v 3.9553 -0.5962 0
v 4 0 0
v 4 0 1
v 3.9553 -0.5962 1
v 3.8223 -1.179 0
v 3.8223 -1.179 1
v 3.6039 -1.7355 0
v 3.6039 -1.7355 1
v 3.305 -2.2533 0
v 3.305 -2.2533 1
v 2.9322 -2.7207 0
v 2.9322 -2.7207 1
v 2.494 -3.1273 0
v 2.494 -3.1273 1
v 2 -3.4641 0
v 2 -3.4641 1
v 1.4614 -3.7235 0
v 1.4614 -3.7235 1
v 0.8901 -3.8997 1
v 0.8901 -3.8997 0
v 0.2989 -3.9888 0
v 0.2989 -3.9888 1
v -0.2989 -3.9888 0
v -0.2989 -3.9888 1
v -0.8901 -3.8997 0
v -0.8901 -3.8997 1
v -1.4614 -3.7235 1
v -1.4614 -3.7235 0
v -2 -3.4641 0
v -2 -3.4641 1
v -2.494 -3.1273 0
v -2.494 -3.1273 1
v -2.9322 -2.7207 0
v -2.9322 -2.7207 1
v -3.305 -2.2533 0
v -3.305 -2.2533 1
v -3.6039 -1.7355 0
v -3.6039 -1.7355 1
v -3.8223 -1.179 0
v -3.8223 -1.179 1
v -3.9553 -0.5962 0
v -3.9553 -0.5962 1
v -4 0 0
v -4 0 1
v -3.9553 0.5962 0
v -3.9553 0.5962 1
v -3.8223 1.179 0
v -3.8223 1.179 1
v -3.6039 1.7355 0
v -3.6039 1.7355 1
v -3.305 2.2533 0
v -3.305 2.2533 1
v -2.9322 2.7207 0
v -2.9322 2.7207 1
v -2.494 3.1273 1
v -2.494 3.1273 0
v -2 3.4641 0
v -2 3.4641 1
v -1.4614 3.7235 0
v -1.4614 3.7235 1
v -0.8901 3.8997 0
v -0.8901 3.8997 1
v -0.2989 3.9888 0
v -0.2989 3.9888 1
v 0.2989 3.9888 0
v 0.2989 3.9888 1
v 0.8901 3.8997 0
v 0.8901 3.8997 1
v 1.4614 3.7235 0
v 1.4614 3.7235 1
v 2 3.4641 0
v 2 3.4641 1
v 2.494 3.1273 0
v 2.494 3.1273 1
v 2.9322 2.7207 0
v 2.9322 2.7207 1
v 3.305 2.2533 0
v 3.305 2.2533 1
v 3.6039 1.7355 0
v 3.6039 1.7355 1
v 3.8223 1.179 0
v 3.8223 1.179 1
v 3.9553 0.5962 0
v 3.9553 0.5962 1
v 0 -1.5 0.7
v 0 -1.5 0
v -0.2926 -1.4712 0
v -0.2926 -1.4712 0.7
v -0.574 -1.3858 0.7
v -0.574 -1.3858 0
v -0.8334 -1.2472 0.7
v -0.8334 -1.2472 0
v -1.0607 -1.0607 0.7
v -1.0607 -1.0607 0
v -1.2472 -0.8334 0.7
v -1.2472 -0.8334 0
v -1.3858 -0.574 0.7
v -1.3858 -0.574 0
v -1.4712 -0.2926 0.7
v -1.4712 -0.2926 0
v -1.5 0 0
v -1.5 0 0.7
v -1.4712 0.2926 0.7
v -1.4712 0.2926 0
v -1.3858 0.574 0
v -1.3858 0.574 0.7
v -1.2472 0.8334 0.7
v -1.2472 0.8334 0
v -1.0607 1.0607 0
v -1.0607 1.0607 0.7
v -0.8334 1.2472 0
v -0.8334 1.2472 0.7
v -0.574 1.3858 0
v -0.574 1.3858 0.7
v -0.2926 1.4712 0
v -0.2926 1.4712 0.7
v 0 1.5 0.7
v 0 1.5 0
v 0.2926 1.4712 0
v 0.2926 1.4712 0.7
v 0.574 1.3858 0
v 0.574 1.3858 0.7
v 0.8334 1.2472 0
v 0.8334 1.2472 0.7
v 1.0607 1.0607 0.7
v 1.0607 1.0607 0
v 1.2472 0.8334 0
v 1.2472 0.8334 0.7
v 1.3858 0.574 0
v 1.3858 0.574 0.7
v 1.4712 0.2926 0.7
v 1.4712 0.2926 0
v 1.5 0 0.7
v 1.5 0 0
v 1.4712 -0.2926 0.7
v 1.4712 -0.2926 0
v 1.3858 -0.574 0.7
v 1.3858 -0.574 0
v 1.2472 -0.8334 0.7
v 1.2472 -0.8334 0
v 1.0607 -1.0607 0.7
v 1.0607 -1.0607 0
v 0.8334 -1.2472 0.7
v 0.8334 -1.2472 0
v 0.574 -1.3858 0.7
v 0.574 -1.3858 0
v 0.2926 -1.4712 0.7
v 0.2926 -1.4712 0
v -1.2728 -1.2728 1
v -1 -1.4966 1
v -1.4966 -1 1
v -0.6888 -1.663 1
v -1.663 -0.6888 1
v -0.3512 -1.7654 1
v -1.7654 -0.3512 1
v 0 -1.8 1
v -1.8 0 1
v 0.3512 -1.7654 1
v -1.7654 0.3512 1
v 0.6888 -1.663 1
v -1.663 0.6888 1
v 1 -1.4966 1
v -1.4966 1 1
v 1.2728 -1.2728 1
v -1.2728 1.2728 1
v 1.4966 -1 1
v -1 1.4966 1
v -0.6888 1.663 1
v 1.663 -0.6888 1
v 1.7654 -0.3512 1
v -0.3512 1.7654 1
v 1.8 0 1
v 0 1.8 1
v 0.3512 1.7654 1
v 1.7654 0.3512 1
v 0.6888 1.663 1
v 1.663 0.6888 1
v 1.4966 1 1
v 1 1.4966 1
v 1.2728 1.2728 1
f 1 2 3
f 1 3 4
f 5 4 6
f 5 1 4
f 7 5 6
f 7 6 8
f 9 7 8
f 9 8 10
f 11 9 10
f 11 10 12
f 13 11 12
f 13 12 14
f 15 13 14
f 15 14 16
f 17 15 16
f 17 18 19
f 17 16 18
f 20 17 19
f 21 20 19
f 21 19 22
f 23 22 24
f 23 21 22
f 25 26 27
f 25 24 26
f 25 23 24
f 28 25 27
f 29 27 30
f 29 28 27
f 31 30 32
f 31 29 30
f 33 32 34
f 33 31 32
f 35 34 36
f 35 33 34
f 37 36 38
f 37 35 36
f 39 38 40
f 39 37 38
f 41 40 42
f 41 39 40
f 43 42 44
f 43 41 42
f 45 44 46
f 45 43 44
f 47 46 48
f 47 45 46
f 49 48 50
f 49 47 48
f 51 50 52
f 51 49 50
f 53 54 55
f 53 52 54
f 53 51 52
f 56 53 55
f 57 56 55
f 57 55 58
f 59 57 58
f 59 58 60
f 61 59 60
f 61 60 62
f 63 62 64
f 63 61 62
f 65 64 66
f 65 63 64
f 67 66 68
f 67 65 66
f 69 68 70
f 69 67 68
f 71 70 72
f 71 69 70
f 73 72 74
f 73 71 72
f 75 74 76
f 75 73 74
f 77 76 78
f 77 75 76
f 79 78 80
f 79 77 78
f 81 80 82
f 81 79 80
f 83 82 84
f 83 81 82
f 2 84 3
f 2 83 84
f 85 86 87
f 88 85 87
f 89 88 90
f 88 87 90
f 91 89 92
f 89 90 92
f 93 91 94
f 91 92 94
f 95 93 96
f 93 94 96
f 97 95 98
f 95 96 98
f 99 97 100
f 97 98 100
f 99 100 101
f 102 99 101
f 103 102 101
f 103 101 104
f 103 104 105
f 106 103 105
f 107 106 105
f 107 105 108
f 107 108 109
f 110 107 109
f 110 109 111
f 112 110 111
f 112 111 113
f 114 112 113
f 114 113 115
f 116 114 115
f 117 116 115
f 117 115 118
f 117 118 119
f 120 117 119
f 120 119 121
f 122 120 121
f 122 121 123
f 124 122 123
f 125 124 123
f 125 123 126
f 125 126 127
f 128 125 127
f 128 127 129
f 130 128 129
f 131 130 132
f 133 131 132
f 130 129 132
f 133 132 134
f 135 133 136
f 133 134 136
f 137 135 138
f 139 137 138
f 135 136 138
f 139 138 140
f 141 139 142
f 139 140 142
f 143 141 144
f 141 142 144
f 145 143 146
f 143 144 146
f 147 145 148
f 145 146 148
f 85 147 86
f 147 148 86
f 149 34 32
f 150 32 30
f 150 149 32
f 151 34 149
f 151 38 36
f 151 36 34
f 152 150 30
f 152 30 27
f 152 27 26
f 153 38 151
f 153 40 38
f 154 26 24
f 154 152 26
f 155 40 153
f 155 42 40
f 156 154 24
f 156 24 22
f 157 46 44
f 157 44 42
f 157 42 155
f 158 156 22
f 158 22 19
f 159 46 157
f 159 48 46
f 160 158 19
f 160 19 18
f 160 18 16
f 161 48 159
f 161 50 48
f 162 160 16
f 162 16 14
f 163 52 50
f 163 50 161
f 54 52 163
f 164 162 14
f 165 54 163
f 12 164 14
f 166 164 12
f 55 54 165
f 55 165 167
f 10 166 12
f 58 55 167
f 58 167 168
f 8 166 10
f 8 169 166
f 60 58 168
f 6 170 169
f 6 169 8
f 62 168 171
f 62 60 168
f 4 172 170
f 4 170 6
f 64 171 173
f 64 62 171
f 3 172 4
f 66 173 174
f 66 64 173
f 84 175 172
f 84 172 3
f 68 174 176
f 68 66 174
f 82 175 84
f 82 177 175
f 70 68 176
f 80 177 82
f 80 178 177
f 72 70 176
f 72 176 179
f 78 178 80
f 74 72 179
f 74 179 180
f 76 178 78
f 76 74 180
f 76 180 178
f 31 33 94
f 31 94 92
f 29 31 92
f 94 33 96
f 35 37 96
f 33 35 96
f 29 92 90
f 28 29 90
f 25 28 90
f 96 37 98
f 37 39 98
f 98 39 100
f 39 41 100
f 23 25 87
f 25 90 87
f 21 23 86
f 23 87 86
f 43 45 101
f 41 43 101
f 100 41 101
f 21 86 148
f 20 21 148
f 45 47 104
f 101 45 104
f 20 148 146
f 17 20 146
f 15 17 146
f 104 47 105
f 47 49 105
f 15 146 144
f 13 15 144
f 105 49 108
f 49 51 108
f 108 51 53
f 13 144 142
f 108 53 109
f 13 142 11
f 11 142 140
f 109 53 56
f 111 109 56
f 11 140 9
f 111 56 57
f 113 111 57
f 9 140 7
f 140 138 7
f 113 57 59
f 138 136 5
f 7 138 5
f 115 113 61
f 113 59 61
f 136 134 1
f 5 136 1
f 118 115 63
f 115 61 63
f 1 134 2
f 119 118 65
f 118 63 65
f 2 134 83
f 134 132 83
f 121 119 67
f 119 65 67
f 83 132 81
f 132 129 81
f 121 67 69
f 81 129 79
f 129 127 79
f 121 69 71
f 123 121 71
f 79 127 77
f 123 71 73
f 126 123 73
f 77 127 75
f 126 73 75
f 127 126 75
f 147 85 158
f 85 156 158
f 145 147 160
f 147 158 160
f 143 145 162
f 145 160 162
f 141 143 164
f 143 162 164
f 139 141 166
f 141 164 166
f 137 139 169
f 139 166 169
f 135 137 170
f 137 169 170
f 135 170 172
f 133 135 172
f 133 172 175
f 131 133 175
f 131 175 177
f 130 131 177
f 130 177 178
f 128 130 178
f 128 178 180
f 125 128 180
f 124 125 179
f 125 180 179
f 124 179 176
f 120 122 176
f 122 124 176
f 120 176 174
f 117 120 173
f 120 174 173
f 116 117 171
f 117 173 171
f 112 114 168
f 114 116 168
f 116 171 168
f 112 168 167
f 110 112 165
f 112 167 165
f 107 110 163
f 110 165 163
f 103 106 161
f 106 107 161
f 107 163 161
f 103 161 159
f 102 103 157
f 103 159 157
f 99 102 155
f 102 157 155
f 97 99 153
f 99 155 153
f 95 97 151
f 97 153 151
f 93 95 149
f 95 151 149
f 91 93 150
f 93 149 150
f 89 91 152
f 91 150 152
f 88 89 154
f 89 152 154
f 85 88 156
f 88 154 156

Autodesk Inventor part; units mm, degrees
ref_plane "YZ Plane" through (0, 0, 0) normal (1, 0, 0) x (0, 1, 0)
ref_plane "XZ Plane" through (0, 0, 0) normal (0, 1, 0) x (-1, 0, 0)
ref_plane "XY Plane" through (0, 0, 0) normal (0, 0, 1) x (1, 0, 0)
sketch "スケッチ1" plane through (0, 0, 0) normal (0, 0, 1) x (1, 0, 0)
  circle A0 centre (0, 0) radius 4
  dimension "d0" = 8
extrude "押し出し1" add sketch "スケッチ1" along normal blind 1
sketch "スケッチ2" plane through (0, 0, 1) normal (0, 0, 1) x (1, 0, 0)
  circle A0 centre (0, 0) radius 1.5
  dimension "d3" = 3
hole "穴1" at (0, 0, 1) direction (0, 0, -1) diameter 3 end through all
chamfer "面取り1" distance 0.3 angle 45 1 edges at (0, 1.5, 1)
properties part number "RD019_ブッシュ80F-0305改"
